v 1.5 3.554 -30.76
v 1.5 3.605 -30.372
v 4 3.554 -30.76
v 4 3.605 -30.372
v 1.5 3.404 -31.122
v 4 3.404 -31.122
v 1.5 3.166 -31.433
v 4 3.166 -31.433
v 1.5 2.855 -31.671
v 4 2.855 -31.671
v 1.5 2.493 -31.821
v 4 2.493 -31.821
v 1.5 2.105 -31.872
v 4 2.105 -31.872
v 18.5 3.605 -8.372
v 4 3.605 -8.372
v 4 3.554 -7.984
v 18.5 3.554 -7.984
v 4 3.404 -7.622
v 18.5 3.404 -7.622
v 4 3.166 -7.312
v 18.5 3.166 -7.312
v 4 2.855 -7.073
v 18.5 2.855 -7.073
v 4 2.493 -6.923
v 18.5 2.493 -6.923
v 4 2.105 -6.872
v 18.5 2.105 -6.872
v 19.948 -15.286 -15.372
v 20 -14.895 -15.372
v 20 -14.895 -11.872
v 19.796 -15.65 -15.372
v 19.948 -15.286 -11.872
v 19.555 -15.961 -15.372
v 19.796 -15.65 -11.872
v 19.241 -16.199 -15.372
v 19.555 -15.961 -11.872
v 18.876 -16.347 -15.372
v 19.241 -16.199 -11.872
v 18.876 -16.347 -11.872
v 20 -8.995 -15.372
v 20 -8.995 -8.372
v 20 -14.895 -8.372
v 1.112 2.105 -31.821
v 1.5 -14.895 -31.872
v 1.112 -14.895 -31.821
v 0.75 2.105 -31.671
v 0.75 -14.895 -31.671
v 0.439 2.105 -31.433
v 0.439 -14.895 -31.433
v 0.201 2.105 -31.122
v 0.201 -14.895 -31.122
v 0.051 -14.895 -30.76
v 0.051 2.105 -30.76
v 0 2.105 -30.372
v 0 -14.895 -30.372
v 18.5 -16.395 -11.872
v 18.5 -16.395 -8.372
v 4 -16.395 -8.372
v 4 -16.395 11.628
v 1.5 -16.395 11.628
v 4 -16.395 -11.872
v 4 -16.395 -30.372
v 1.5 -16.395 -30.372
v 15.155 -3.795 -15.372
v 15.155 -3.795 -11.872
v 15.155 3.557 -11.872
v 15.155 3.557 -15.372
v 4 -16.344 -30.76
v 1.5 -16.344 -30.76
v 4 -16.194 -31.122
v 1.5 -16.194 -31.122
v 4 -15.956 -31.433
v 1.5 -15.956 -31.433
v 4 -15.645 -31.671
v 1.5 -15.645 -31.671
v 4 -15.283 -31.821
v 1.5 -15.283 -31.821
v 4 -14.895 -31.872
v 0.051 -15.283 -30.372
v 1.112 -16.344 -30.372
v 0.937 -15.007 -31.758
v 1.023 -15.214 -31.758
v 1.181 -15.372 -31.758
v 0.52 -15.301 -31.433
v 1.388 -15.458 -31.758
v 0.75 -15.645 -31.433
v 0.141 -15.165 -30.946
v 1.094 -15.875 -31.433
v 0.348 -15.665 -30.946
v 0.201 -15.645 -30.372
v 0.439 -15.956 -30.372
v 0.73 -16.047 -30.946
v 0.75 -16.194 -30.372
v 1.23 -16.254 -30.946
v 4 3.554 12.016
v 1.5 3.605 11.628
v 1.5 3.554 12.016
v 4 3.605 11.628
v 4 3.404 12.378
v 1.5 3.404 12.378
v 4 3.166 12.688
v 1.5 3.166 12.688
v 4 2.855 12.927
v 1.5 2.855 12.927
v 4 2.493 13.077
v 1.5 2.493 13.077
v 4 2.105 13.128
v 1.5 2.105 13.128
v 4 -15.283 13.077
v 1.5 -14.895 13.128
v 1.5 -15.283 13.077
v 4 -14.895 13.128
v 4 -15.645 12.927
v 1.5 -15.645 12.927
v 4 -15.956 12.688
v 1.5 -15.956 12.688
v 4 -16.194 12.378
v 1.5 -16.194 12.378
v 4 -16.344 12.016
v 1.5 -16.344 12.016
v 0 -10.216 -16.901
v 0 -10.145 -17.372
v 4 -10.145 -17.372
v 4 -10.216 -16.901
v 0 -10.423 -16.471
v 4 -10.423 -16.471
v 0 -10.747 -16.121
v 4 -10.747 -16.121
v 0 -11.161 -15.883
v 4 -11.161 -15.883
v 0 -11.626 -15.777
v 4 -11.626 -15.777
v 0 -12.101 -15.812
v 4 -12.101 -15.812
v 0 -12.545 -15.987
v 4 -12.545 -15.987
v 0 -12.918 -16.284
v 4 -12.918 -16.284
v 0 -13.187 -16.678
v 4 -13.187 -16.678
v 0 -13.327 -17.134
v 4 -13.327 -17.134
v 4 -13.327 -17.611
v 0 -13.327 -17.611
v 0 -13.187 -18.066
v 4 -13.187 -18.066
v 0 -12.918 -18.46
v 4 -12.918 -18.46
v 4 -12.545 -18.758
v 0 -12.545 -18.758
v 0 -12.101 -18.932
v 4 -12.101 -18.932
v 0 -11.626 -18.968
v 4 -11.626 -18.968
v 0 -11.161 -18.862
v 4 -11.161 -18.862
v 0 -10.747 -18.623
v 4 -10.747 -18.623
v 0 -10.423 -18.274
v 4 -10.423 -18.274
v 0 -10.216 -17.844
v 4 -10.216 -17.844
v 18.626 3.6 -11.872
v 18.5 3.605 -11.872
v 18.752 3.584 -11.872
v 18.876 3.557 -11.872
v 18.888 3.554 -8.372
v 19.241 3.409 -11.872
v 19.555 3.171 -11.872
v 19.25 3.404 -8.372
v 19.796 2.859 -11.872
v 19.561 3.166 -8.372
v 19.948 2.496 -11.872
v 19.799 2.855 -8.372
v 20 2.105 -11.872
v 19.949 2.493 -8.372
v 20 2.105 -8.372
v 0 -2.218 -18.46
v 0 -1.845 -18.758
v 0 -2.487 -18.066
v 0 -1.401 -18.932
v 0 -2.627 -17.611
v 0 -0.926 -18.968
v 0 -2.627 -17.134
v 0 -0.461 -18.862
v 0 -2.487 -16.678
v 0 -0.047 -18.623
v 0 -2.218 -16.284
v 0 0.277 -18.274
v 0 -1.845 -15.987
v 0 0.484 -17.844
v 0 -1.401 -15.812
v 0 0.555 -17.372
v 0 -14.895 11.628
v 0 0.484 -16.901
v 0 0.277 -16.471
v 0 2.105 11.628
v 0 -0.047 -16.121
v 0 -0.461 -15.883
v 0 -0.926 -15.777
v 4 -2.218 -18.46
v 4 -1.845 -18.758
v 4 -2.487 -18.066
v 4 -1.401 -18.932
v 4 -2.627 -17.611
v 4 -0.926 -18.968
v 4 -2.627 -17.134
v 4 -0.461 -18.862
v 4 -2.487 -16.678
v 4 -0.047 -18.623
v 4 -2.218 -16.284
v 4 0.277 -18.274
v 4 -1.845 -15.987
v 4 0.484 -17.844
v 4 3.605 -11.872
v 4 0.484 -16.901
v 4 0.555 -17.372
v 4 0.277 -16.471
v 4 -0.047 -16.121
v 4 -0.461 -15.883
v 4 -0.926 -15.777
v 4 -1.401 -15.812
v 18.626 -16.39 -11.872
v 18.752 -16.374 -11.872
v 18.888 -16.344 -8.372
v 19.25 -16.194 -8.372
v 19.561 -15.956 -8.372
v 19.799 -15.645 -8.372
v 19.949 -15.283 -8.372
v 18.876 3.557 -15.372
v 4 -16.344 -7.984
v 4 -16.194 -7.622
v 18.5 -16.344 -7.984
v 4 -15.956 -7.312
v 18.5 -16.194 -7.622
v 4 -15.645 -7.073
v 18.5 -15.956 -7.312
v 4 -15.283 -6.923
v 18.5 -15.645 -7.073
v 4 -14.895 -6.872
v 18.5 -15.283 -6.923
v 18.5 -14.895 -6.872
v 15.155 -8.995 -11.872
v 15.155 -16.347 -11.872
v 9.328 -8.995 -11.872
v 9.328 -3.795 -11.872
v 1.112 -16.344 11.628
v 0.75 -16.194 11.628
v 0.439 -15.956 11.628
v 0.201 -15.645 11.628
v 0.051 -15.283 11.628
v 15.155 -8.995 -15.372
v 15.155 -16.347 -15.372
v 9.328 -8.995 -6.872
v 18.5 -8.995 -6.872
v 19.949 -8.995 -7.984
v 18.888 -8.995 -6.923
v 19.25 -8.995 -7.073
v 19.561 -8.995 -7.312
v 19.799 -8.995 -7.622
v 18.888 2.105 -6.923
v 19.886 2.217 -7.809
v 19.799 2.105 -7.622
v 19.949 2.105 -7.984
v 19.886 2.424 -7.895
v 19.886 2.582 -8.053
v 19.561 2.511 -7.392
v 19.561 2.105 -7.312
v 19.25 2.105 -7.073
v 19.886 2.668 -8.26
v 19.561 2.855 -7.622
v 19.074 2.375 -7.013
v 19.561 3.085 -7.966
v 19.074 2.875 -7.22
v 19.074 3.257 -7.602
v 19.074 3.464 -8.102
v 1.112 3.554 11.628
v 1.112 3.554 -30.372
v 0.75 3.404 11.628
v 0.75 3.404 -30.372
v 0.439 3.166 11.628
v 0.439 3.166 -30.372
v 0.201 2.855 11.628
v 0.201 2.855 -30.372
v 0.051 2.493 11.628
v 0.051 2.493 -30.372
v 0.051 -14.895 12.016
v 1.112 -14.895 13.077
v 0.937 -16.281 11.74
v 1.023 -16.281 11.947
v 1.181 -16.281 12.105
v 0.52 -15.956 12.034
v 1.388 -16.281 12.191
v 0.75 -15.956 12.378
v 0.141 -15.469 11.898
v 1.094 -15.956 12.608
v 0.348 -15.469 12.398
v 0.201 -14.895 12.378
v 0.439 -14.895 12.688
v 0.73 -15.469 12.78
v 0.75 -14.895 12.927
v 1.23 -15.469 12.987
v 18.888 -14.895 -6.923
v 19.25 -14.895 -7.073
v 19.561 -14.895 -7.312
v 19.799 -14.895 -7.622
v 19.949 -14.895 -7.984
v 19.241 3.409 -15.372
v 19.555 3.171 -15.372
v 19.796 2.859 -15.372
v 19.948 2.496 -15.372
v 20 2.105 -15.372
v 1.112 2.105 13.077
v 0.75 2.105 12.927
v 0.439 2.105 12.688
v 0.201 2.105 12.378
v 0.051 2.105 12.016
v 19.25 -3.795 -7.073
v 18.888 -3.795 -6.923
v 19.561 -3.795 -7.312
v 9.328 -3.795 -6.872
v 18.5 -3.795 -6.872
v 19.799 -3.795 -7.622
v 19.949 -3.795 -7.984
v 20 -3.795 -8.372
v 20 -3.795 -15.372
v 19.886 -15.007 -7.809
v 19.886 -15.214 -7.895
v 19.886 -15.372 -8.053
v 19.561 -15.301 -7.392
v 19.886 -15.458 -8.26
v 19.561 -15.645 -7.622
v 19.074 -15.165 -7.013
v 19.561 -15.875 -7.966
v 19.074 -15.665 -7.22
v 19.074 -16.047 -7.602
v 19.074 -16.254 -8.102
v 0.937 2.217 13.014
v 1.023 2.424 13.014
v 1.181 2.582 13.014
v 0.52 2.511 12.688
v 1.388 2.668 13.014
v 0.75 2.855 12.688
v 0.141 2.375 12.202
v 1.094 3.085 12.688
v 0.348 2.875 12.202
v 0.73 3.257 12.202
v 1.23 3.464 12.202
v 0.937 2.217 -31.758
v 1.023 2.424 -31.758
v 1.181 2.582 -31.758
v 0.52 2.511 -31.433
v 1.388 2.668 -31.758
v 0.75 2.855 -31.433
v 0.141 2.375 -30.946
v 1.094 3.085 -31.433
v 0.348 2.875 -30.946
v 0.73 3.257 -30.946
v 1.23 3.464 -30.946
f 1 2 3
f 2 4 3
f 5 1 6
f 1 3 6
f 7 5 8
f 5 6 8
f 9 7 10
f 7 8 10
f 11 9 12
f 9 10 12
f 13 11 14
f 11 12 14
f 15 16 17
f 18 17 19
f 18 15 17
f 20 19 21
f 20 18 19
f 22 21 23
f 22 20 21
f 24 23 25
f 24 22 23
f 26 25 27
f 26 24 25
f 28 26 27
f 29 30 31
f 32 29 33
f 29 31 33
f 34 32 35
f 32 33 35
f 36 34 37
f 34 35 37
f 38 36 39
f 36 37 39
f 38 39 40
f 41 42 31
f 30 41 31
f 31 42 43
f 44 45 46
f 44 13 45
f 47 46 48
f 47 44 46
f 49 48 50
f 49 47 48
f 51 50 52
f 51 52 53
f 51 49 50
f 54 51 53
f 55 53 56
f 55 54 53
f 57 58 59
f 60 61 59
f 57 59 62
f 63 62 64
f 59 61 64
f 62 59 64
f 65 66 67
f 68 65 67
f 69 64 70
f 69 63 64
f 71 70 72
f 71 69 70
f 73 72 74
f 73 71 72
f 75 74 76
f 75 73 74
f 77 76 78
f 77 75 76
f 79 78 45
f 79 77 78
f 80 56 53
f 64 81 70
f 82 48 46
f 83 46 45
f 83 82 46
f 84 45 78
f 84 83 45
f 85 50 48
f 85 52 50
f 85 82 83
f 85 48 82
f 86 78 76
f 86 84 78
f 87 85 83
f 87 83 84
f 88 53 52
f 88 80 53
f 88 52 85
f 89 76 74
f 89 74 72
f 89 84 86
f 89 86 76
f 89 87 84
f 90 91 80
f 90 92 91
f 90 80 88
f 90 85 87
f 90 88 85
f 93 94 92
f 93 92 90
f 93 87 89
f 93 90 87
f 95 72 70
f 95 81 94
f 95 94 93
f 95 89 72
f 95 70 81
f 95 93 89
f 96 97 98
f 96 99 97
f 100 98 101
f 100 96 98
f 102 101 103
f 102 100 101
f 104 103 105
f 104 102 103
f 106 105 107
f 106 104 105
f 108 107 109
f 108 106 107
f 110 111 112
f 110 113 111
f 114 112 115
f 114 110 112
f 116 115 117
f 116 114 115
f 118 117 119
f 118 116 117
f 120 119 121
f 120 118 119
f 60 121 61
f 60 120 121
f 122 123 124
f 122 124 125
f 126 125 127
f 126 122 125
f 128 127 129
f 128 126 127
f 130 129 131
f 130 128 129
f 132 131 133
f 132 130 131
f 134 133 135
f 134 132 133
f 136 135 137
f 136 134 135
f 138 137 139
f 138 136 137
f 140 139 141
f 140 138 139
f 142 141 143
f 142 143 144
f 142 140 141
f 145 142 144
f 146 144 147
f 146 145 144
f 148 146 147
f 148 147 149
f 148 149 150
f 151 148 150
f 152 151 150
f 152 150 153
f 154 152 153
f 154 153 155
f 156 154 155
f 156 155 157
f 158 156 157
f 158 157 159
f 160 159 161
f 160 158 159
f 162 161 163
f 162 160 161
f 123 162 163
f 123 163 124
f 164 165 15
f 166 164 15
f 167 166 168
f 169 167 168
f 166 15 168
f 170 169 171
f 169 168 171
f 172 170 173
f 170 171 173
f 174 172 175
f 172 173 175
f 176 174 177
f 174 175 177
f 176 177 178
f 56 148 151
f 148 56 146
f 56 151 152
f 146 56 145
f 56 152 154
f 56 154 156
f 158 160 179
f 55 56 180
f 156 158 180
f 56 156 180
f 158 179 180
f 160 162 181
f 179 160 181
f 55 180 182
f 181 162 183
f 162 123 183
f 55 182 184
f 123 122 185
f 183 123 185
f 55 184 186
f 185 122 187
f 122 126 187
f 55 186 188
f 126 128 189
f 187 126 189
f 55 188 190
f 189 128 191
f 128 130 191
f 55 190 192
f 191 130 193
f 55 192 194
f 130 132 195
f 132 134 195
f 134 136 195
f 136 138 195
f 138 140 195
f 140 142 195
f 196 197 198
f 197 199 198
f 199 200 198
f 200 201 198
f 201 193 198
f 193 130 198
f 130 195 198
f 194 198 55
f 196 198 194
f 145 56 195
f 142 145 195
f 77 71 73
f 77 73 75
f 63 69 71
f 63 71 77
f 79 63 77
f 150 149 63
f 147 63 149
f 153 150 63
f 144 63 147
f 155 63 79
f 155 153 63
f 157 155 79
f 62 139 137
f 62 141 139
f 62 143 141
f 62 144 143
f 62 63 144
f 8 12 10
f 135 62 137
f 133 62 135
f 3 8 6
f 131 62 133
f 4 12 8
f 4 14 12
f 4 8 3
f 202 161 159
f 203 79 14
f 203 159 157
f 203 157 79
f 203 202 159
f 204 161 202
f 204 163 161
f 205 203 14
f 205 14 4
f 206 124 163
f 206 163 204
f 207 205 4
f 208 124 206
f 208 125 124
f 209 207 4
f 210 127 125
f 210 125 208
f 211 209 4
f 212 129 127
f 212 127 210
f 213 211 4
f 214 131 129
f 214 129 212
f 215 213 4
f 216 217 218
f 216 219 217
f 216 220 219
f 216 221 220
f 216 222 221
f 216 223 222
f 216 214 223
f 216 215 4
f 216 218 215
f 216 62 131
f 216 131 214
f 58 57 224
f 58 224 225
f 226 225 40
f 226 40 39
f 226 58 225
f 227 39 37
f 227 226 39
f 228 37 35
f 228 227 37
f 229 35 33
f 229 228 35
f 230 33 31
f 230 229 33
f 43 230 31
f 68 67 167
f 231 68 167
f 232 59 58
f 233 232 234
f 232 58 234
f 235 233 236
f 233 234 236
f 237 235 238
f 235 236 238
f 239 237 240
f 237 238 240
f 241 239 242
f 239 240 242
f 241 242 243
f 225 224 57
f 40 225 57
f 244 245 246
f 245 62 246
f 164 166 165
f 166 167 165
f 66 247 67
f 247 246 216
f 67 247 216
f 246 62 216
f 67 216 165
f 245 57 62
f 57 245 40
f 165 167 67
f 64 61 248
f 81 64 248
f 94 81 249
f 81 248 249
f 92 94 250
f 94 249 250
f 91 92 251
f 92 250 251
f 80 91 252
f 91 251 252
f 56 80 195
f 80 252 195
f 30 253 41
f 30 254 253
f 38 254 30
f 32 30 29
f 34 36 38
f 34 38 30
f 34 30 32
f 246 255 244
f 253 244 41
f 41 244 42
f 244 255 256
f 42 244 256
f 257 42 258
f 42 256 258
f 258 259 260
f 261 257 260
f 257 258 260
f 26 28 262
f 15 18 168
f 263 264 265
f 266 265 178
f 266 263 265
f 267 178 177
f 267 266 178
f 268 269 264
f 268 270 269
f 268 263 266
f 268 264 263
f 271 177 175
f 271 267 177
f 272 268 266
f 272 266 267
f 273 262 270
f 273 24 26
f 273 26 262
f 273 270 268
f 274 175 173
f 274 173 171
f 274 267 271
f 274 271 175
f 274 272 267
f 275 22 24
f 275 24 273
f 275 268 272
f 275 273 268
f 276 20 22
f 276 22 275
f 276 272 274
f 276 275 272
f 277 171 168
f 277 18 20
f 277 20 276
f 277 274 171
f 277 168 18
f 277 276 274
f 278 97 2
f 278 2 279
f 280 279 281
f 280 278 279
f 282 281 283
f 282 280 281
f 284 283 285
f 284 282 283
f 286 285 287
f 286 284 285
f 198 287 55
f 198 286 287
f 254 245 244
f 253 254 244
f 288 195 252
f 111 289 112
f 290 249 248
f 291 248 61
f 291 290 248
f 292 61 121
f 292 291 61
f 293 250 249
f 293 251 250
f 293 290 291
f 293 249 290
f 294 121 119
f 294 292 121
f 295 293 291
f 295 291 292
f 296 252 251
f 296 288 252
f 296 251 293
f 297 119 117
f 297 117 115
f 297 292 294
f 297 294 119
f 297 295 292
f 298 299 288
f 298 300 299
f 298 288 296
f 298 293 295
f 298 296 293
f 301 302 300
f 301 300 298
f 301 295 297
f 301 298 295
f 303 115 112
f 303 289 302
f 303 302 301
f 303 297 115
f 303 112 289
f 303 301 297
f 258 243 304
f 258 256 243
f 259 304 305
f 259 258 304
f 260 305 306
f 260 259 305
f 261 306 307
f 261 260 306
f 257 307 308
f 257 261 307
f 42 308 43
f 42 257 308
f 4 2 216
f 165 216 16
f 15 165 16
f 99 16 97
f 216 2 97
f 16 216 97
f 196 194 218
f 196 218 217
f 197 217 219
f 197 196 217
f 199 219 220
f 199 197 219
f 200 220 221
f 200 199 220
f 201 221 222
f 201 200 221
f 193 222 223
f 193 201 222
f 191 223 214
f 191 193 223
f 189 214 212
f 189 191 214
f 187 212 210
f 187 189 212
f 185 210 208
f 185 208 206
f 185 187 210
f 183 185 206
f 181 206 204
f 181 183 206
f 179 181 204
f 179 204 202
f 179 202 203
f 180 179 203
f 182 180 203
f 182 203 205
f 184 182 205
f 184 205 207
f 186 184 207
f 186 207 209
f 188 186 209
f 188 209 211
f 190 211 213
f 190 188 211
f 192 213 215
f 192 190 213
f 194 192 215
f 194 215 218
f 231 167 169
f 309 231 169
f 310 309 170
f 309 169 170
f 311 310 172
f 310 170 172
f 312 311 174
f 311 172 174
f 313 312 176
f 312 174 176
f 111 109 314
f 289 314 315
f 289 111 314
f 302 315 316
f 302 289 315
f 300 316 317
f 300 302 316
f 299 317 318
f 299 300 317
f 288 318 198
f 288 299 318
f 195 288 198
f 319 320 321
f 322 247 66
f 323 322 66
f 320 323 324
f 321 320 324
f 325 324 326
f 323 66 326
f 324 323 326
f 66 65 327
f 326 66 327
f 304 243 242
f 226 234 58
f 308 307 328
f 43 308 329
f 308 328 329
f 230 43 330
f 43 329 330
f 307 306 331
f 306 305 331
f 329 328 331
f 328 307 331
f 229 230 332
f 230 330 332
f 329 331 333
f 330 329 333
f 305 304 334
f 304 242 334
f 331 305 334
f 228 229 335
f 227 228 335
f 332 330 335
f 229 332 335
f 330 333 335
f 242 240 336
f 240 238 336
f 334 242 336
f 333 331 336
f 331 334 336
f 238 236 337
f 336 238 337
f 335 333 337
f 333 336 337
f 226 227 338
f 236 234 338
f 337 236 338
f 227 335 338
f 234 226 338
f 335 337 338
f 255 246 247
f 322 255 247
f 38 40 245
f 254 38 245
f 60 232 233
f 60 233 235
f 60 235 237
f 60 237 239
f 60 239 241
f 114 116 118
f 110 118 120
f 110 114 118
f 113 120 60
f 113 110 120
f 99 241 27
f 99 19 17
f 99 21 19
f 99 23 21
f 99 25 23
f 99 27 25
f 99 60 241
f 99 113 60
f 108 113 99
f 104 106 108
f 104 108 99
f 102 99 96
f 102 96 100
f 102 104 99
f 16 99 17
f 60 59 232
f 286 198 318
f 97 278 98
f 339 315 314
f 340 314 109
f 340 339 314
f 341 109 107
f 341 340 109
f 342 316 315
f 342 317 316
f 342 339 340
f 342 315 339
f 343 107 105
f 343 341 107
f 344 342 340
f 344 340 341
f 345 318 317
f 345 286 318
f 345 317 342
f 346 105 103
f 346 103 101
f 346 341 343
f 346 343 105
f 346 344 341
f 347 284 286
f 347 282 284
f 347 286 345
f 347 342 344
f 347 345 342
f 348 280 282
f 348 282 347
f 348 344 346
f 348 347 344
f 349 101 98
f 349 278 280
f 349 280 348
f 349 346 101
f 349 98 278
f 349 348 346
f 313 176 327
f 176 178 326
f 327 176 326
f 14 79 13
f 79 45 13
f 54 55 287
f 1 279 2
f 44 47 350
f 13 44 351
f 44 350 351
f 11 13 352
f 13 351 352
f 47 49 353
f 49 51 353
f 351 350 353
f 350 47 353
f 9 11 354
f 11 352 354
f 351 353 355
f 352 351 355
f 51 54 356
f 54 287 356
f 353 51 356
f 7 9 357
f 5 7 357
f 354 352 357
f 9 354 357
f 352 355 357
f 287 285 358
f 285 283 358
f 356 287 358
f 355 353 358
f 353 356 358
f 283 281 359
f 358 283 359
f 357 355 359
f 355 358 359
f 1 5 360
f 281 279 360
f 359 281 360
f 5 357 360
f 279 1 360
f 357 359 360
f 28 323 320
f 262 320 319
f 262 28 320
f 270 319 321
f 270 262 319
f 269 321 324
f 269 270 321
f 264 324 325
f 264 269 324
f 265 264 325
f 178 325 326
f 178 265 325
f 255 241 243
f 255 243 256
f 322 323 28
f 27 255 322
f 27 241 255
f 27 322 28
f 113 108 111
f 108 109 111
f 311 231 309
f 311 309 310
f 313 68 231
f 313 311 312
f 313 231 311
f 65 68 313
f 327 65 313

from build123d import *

# Parameters (mm, degrees)
F0_W     = 20
F0_H     = 5
F0_W_2   = 10
F0_H_2   = 3.8665379398
F0_H_3   = 20
F0_R     = 1.6
F1_DEPTH = 4
F2_DEPTH = 20
F3_DEPTH = 66
F4_R     = 1.5
F6_DEPTH = 3.5
F7_DEPTH = 3.5
F8_DEPTH = 25


# Not quite as in the source:
# - an extrude ends at something that could not be found from the text; its depth is read off the source's solid


with BuildPart() as f1:
    # F0 (on Right) → F1 (new body)
    with BuildSketch(Plane.YZ):
        Polygon((3.6049238205, -6.8721993268), (3.6049238205, 13.1278006732), (-16.3950761795, 13.1278006732), (-16.3950761795, 6.6331364214), (-6.3950761795, 6.6331364214), (-6.3950761795, 2.7665984817), (-16.3950761795, 2.7665984817), (-16.3950761795, -6.8721993268), align=None)
        with Locations((-6.3950761795, -9.3721993268)):
            Rectangle(F0_W, F0_H)
        with Locations((-11.3950761795, 4.6998674516)):
            Rectangle(F0_W_2, F0_H_2)
        with Locations((-6.3950761795, -21.8721993268)):
            Rectangle(F0_W, F0_H_3)
        with Locations((-11.7450761795, -17.3721993268)):
            Circle(F0_R, mode=Mode.SUBTRACT)
        with Locations((-1.0450761795, -17.3721993268)):
            Circle(F0_R, mode=Mode.SUBTRACT)
    extrude(amount=F1_DEPTH)

    # F0 (on Right) → F2 (join)
    with BuildSketch(Plane.YZ):
        with Locations((-6.3950761795, -9.3721993268)):
            Rectangle(F0_W, F0_H)
    extrude(amount=F2_DEPTH)

    # F0 (on Right) → F3 (cut, through all)
    with BuildSketch(Plane.YZ):
        with Locations((-1.0450761795, -17.3721993268)):
            Circle(F0_R)
    extrude(amount=-F3_DEPTH, mode=Mode.SUBTRACT)

    # F4
    f4_edges = [f1.edges().sort_by_distance(p)[0] for p in [
        (0, 3.604924, -9.372199),
        (0, -6.395076, 13.127801),
        (0, -16.395076, -9.372199),
        (0, -6.395076, -31.872199),
        (2, 3.604924, 13.127801),
        (2, 3.604924, -31.872199),
        (2, -16.395076, 13.127801),
        (2, -16.395076, -31.872199),
        (12, -16.395076, -6.872199),
        (12, 3.604924, -6.872199),
        (20, -6.395076, -6.872199),
        (20, 3.604924, -9.372199),
        (20, -16.395076, -9.372199),
    ]]
    fillet(f4_edges, radius=F4_R)

    # F5 (on face) → F6 (join)
    with BuildSketch(Plane(origin=(0, 0, -11.8721993268), x_dir=(1, 0, 0), z_dir=(0, 0, -1))):
        with BuildLine():
            Line((15.1547100395, 8.9950761795), (20, 8.9950761795))
            Line((20, 8.9950761795), (20, 14.8950761795))
            ThreePointArc((20, 14.8950761795), (19.686066448, 15.8133606567), (18.8756714919, 16.3472713903))
            Line((18.8756714919, 16.3472713903), (15.1547100395, 16.3472713903))
            Line((15.1547100395, 16.3472713903), (15.1547100395, 8.9950761795))
        make_face()
        with BuildLine():
            Line((20, -2.1049238205), (20, 3.7950761795))
            Line((20, 3.7950761795), (15.1547100395, 3.7950761795))
            Line((15.1547100395, 3.7950761795), (15.1547100395, -3.5571190313))
            Line((15.1547100395, -3.5571190313), (18.8756714919, -3.5571190313))
            ThreePointArc((18.8756714919, -3.5571190313), (19.686066448, -3.0232082977), (20, -2.1049238205))
        make_face()
    extrude(amount=F6_DEPTH)

    # F5 (on face) → F7 (join)
    with BuildSketch(Plane(origin=(0, 0, -11.8721993268), x_dir=(1, 0, 0), z_dir=(0, 0, -1))):
        with BuildLine():
            Line((15.1547100395, 8.9950761795), (20, 8.9950761795))
            Line((20, 8.9950761795), (20, 14.8950761795))
            ThreePointArc((20, 14.8950761795), (19.686066448, 15.8133606567), (18.8756714919, 16.3472713903))
            Line((18.8756714919, 16.3472713903), (15.1547100395, 16.3472713903))
            Line((15.1547100395, 16.3472713903), (15.1547100395, 8.9950761795))
        make_face()
    extrude(amount=F7_DEPTH)

    # F5 (on face) → F8 (cut)
    with BuildSketch(Plane(origin=(0, 0, -11.8721993268), x_dir=(1, 0, 0), z_dir=(0, 0, -1))):
        Polygon((20, 3.7950761795), (20, 8.9950761795), (15.1547100395, 8.9950761795), (9.3279955909, 8.9950761795), (9.3279955909, 3.7950761795), (15.1547100395, 3.7950761795), align=None)
    extrude(amount=-F8_DEPTH, mode=Mode.SUBTRACT)


solid = f1.part
